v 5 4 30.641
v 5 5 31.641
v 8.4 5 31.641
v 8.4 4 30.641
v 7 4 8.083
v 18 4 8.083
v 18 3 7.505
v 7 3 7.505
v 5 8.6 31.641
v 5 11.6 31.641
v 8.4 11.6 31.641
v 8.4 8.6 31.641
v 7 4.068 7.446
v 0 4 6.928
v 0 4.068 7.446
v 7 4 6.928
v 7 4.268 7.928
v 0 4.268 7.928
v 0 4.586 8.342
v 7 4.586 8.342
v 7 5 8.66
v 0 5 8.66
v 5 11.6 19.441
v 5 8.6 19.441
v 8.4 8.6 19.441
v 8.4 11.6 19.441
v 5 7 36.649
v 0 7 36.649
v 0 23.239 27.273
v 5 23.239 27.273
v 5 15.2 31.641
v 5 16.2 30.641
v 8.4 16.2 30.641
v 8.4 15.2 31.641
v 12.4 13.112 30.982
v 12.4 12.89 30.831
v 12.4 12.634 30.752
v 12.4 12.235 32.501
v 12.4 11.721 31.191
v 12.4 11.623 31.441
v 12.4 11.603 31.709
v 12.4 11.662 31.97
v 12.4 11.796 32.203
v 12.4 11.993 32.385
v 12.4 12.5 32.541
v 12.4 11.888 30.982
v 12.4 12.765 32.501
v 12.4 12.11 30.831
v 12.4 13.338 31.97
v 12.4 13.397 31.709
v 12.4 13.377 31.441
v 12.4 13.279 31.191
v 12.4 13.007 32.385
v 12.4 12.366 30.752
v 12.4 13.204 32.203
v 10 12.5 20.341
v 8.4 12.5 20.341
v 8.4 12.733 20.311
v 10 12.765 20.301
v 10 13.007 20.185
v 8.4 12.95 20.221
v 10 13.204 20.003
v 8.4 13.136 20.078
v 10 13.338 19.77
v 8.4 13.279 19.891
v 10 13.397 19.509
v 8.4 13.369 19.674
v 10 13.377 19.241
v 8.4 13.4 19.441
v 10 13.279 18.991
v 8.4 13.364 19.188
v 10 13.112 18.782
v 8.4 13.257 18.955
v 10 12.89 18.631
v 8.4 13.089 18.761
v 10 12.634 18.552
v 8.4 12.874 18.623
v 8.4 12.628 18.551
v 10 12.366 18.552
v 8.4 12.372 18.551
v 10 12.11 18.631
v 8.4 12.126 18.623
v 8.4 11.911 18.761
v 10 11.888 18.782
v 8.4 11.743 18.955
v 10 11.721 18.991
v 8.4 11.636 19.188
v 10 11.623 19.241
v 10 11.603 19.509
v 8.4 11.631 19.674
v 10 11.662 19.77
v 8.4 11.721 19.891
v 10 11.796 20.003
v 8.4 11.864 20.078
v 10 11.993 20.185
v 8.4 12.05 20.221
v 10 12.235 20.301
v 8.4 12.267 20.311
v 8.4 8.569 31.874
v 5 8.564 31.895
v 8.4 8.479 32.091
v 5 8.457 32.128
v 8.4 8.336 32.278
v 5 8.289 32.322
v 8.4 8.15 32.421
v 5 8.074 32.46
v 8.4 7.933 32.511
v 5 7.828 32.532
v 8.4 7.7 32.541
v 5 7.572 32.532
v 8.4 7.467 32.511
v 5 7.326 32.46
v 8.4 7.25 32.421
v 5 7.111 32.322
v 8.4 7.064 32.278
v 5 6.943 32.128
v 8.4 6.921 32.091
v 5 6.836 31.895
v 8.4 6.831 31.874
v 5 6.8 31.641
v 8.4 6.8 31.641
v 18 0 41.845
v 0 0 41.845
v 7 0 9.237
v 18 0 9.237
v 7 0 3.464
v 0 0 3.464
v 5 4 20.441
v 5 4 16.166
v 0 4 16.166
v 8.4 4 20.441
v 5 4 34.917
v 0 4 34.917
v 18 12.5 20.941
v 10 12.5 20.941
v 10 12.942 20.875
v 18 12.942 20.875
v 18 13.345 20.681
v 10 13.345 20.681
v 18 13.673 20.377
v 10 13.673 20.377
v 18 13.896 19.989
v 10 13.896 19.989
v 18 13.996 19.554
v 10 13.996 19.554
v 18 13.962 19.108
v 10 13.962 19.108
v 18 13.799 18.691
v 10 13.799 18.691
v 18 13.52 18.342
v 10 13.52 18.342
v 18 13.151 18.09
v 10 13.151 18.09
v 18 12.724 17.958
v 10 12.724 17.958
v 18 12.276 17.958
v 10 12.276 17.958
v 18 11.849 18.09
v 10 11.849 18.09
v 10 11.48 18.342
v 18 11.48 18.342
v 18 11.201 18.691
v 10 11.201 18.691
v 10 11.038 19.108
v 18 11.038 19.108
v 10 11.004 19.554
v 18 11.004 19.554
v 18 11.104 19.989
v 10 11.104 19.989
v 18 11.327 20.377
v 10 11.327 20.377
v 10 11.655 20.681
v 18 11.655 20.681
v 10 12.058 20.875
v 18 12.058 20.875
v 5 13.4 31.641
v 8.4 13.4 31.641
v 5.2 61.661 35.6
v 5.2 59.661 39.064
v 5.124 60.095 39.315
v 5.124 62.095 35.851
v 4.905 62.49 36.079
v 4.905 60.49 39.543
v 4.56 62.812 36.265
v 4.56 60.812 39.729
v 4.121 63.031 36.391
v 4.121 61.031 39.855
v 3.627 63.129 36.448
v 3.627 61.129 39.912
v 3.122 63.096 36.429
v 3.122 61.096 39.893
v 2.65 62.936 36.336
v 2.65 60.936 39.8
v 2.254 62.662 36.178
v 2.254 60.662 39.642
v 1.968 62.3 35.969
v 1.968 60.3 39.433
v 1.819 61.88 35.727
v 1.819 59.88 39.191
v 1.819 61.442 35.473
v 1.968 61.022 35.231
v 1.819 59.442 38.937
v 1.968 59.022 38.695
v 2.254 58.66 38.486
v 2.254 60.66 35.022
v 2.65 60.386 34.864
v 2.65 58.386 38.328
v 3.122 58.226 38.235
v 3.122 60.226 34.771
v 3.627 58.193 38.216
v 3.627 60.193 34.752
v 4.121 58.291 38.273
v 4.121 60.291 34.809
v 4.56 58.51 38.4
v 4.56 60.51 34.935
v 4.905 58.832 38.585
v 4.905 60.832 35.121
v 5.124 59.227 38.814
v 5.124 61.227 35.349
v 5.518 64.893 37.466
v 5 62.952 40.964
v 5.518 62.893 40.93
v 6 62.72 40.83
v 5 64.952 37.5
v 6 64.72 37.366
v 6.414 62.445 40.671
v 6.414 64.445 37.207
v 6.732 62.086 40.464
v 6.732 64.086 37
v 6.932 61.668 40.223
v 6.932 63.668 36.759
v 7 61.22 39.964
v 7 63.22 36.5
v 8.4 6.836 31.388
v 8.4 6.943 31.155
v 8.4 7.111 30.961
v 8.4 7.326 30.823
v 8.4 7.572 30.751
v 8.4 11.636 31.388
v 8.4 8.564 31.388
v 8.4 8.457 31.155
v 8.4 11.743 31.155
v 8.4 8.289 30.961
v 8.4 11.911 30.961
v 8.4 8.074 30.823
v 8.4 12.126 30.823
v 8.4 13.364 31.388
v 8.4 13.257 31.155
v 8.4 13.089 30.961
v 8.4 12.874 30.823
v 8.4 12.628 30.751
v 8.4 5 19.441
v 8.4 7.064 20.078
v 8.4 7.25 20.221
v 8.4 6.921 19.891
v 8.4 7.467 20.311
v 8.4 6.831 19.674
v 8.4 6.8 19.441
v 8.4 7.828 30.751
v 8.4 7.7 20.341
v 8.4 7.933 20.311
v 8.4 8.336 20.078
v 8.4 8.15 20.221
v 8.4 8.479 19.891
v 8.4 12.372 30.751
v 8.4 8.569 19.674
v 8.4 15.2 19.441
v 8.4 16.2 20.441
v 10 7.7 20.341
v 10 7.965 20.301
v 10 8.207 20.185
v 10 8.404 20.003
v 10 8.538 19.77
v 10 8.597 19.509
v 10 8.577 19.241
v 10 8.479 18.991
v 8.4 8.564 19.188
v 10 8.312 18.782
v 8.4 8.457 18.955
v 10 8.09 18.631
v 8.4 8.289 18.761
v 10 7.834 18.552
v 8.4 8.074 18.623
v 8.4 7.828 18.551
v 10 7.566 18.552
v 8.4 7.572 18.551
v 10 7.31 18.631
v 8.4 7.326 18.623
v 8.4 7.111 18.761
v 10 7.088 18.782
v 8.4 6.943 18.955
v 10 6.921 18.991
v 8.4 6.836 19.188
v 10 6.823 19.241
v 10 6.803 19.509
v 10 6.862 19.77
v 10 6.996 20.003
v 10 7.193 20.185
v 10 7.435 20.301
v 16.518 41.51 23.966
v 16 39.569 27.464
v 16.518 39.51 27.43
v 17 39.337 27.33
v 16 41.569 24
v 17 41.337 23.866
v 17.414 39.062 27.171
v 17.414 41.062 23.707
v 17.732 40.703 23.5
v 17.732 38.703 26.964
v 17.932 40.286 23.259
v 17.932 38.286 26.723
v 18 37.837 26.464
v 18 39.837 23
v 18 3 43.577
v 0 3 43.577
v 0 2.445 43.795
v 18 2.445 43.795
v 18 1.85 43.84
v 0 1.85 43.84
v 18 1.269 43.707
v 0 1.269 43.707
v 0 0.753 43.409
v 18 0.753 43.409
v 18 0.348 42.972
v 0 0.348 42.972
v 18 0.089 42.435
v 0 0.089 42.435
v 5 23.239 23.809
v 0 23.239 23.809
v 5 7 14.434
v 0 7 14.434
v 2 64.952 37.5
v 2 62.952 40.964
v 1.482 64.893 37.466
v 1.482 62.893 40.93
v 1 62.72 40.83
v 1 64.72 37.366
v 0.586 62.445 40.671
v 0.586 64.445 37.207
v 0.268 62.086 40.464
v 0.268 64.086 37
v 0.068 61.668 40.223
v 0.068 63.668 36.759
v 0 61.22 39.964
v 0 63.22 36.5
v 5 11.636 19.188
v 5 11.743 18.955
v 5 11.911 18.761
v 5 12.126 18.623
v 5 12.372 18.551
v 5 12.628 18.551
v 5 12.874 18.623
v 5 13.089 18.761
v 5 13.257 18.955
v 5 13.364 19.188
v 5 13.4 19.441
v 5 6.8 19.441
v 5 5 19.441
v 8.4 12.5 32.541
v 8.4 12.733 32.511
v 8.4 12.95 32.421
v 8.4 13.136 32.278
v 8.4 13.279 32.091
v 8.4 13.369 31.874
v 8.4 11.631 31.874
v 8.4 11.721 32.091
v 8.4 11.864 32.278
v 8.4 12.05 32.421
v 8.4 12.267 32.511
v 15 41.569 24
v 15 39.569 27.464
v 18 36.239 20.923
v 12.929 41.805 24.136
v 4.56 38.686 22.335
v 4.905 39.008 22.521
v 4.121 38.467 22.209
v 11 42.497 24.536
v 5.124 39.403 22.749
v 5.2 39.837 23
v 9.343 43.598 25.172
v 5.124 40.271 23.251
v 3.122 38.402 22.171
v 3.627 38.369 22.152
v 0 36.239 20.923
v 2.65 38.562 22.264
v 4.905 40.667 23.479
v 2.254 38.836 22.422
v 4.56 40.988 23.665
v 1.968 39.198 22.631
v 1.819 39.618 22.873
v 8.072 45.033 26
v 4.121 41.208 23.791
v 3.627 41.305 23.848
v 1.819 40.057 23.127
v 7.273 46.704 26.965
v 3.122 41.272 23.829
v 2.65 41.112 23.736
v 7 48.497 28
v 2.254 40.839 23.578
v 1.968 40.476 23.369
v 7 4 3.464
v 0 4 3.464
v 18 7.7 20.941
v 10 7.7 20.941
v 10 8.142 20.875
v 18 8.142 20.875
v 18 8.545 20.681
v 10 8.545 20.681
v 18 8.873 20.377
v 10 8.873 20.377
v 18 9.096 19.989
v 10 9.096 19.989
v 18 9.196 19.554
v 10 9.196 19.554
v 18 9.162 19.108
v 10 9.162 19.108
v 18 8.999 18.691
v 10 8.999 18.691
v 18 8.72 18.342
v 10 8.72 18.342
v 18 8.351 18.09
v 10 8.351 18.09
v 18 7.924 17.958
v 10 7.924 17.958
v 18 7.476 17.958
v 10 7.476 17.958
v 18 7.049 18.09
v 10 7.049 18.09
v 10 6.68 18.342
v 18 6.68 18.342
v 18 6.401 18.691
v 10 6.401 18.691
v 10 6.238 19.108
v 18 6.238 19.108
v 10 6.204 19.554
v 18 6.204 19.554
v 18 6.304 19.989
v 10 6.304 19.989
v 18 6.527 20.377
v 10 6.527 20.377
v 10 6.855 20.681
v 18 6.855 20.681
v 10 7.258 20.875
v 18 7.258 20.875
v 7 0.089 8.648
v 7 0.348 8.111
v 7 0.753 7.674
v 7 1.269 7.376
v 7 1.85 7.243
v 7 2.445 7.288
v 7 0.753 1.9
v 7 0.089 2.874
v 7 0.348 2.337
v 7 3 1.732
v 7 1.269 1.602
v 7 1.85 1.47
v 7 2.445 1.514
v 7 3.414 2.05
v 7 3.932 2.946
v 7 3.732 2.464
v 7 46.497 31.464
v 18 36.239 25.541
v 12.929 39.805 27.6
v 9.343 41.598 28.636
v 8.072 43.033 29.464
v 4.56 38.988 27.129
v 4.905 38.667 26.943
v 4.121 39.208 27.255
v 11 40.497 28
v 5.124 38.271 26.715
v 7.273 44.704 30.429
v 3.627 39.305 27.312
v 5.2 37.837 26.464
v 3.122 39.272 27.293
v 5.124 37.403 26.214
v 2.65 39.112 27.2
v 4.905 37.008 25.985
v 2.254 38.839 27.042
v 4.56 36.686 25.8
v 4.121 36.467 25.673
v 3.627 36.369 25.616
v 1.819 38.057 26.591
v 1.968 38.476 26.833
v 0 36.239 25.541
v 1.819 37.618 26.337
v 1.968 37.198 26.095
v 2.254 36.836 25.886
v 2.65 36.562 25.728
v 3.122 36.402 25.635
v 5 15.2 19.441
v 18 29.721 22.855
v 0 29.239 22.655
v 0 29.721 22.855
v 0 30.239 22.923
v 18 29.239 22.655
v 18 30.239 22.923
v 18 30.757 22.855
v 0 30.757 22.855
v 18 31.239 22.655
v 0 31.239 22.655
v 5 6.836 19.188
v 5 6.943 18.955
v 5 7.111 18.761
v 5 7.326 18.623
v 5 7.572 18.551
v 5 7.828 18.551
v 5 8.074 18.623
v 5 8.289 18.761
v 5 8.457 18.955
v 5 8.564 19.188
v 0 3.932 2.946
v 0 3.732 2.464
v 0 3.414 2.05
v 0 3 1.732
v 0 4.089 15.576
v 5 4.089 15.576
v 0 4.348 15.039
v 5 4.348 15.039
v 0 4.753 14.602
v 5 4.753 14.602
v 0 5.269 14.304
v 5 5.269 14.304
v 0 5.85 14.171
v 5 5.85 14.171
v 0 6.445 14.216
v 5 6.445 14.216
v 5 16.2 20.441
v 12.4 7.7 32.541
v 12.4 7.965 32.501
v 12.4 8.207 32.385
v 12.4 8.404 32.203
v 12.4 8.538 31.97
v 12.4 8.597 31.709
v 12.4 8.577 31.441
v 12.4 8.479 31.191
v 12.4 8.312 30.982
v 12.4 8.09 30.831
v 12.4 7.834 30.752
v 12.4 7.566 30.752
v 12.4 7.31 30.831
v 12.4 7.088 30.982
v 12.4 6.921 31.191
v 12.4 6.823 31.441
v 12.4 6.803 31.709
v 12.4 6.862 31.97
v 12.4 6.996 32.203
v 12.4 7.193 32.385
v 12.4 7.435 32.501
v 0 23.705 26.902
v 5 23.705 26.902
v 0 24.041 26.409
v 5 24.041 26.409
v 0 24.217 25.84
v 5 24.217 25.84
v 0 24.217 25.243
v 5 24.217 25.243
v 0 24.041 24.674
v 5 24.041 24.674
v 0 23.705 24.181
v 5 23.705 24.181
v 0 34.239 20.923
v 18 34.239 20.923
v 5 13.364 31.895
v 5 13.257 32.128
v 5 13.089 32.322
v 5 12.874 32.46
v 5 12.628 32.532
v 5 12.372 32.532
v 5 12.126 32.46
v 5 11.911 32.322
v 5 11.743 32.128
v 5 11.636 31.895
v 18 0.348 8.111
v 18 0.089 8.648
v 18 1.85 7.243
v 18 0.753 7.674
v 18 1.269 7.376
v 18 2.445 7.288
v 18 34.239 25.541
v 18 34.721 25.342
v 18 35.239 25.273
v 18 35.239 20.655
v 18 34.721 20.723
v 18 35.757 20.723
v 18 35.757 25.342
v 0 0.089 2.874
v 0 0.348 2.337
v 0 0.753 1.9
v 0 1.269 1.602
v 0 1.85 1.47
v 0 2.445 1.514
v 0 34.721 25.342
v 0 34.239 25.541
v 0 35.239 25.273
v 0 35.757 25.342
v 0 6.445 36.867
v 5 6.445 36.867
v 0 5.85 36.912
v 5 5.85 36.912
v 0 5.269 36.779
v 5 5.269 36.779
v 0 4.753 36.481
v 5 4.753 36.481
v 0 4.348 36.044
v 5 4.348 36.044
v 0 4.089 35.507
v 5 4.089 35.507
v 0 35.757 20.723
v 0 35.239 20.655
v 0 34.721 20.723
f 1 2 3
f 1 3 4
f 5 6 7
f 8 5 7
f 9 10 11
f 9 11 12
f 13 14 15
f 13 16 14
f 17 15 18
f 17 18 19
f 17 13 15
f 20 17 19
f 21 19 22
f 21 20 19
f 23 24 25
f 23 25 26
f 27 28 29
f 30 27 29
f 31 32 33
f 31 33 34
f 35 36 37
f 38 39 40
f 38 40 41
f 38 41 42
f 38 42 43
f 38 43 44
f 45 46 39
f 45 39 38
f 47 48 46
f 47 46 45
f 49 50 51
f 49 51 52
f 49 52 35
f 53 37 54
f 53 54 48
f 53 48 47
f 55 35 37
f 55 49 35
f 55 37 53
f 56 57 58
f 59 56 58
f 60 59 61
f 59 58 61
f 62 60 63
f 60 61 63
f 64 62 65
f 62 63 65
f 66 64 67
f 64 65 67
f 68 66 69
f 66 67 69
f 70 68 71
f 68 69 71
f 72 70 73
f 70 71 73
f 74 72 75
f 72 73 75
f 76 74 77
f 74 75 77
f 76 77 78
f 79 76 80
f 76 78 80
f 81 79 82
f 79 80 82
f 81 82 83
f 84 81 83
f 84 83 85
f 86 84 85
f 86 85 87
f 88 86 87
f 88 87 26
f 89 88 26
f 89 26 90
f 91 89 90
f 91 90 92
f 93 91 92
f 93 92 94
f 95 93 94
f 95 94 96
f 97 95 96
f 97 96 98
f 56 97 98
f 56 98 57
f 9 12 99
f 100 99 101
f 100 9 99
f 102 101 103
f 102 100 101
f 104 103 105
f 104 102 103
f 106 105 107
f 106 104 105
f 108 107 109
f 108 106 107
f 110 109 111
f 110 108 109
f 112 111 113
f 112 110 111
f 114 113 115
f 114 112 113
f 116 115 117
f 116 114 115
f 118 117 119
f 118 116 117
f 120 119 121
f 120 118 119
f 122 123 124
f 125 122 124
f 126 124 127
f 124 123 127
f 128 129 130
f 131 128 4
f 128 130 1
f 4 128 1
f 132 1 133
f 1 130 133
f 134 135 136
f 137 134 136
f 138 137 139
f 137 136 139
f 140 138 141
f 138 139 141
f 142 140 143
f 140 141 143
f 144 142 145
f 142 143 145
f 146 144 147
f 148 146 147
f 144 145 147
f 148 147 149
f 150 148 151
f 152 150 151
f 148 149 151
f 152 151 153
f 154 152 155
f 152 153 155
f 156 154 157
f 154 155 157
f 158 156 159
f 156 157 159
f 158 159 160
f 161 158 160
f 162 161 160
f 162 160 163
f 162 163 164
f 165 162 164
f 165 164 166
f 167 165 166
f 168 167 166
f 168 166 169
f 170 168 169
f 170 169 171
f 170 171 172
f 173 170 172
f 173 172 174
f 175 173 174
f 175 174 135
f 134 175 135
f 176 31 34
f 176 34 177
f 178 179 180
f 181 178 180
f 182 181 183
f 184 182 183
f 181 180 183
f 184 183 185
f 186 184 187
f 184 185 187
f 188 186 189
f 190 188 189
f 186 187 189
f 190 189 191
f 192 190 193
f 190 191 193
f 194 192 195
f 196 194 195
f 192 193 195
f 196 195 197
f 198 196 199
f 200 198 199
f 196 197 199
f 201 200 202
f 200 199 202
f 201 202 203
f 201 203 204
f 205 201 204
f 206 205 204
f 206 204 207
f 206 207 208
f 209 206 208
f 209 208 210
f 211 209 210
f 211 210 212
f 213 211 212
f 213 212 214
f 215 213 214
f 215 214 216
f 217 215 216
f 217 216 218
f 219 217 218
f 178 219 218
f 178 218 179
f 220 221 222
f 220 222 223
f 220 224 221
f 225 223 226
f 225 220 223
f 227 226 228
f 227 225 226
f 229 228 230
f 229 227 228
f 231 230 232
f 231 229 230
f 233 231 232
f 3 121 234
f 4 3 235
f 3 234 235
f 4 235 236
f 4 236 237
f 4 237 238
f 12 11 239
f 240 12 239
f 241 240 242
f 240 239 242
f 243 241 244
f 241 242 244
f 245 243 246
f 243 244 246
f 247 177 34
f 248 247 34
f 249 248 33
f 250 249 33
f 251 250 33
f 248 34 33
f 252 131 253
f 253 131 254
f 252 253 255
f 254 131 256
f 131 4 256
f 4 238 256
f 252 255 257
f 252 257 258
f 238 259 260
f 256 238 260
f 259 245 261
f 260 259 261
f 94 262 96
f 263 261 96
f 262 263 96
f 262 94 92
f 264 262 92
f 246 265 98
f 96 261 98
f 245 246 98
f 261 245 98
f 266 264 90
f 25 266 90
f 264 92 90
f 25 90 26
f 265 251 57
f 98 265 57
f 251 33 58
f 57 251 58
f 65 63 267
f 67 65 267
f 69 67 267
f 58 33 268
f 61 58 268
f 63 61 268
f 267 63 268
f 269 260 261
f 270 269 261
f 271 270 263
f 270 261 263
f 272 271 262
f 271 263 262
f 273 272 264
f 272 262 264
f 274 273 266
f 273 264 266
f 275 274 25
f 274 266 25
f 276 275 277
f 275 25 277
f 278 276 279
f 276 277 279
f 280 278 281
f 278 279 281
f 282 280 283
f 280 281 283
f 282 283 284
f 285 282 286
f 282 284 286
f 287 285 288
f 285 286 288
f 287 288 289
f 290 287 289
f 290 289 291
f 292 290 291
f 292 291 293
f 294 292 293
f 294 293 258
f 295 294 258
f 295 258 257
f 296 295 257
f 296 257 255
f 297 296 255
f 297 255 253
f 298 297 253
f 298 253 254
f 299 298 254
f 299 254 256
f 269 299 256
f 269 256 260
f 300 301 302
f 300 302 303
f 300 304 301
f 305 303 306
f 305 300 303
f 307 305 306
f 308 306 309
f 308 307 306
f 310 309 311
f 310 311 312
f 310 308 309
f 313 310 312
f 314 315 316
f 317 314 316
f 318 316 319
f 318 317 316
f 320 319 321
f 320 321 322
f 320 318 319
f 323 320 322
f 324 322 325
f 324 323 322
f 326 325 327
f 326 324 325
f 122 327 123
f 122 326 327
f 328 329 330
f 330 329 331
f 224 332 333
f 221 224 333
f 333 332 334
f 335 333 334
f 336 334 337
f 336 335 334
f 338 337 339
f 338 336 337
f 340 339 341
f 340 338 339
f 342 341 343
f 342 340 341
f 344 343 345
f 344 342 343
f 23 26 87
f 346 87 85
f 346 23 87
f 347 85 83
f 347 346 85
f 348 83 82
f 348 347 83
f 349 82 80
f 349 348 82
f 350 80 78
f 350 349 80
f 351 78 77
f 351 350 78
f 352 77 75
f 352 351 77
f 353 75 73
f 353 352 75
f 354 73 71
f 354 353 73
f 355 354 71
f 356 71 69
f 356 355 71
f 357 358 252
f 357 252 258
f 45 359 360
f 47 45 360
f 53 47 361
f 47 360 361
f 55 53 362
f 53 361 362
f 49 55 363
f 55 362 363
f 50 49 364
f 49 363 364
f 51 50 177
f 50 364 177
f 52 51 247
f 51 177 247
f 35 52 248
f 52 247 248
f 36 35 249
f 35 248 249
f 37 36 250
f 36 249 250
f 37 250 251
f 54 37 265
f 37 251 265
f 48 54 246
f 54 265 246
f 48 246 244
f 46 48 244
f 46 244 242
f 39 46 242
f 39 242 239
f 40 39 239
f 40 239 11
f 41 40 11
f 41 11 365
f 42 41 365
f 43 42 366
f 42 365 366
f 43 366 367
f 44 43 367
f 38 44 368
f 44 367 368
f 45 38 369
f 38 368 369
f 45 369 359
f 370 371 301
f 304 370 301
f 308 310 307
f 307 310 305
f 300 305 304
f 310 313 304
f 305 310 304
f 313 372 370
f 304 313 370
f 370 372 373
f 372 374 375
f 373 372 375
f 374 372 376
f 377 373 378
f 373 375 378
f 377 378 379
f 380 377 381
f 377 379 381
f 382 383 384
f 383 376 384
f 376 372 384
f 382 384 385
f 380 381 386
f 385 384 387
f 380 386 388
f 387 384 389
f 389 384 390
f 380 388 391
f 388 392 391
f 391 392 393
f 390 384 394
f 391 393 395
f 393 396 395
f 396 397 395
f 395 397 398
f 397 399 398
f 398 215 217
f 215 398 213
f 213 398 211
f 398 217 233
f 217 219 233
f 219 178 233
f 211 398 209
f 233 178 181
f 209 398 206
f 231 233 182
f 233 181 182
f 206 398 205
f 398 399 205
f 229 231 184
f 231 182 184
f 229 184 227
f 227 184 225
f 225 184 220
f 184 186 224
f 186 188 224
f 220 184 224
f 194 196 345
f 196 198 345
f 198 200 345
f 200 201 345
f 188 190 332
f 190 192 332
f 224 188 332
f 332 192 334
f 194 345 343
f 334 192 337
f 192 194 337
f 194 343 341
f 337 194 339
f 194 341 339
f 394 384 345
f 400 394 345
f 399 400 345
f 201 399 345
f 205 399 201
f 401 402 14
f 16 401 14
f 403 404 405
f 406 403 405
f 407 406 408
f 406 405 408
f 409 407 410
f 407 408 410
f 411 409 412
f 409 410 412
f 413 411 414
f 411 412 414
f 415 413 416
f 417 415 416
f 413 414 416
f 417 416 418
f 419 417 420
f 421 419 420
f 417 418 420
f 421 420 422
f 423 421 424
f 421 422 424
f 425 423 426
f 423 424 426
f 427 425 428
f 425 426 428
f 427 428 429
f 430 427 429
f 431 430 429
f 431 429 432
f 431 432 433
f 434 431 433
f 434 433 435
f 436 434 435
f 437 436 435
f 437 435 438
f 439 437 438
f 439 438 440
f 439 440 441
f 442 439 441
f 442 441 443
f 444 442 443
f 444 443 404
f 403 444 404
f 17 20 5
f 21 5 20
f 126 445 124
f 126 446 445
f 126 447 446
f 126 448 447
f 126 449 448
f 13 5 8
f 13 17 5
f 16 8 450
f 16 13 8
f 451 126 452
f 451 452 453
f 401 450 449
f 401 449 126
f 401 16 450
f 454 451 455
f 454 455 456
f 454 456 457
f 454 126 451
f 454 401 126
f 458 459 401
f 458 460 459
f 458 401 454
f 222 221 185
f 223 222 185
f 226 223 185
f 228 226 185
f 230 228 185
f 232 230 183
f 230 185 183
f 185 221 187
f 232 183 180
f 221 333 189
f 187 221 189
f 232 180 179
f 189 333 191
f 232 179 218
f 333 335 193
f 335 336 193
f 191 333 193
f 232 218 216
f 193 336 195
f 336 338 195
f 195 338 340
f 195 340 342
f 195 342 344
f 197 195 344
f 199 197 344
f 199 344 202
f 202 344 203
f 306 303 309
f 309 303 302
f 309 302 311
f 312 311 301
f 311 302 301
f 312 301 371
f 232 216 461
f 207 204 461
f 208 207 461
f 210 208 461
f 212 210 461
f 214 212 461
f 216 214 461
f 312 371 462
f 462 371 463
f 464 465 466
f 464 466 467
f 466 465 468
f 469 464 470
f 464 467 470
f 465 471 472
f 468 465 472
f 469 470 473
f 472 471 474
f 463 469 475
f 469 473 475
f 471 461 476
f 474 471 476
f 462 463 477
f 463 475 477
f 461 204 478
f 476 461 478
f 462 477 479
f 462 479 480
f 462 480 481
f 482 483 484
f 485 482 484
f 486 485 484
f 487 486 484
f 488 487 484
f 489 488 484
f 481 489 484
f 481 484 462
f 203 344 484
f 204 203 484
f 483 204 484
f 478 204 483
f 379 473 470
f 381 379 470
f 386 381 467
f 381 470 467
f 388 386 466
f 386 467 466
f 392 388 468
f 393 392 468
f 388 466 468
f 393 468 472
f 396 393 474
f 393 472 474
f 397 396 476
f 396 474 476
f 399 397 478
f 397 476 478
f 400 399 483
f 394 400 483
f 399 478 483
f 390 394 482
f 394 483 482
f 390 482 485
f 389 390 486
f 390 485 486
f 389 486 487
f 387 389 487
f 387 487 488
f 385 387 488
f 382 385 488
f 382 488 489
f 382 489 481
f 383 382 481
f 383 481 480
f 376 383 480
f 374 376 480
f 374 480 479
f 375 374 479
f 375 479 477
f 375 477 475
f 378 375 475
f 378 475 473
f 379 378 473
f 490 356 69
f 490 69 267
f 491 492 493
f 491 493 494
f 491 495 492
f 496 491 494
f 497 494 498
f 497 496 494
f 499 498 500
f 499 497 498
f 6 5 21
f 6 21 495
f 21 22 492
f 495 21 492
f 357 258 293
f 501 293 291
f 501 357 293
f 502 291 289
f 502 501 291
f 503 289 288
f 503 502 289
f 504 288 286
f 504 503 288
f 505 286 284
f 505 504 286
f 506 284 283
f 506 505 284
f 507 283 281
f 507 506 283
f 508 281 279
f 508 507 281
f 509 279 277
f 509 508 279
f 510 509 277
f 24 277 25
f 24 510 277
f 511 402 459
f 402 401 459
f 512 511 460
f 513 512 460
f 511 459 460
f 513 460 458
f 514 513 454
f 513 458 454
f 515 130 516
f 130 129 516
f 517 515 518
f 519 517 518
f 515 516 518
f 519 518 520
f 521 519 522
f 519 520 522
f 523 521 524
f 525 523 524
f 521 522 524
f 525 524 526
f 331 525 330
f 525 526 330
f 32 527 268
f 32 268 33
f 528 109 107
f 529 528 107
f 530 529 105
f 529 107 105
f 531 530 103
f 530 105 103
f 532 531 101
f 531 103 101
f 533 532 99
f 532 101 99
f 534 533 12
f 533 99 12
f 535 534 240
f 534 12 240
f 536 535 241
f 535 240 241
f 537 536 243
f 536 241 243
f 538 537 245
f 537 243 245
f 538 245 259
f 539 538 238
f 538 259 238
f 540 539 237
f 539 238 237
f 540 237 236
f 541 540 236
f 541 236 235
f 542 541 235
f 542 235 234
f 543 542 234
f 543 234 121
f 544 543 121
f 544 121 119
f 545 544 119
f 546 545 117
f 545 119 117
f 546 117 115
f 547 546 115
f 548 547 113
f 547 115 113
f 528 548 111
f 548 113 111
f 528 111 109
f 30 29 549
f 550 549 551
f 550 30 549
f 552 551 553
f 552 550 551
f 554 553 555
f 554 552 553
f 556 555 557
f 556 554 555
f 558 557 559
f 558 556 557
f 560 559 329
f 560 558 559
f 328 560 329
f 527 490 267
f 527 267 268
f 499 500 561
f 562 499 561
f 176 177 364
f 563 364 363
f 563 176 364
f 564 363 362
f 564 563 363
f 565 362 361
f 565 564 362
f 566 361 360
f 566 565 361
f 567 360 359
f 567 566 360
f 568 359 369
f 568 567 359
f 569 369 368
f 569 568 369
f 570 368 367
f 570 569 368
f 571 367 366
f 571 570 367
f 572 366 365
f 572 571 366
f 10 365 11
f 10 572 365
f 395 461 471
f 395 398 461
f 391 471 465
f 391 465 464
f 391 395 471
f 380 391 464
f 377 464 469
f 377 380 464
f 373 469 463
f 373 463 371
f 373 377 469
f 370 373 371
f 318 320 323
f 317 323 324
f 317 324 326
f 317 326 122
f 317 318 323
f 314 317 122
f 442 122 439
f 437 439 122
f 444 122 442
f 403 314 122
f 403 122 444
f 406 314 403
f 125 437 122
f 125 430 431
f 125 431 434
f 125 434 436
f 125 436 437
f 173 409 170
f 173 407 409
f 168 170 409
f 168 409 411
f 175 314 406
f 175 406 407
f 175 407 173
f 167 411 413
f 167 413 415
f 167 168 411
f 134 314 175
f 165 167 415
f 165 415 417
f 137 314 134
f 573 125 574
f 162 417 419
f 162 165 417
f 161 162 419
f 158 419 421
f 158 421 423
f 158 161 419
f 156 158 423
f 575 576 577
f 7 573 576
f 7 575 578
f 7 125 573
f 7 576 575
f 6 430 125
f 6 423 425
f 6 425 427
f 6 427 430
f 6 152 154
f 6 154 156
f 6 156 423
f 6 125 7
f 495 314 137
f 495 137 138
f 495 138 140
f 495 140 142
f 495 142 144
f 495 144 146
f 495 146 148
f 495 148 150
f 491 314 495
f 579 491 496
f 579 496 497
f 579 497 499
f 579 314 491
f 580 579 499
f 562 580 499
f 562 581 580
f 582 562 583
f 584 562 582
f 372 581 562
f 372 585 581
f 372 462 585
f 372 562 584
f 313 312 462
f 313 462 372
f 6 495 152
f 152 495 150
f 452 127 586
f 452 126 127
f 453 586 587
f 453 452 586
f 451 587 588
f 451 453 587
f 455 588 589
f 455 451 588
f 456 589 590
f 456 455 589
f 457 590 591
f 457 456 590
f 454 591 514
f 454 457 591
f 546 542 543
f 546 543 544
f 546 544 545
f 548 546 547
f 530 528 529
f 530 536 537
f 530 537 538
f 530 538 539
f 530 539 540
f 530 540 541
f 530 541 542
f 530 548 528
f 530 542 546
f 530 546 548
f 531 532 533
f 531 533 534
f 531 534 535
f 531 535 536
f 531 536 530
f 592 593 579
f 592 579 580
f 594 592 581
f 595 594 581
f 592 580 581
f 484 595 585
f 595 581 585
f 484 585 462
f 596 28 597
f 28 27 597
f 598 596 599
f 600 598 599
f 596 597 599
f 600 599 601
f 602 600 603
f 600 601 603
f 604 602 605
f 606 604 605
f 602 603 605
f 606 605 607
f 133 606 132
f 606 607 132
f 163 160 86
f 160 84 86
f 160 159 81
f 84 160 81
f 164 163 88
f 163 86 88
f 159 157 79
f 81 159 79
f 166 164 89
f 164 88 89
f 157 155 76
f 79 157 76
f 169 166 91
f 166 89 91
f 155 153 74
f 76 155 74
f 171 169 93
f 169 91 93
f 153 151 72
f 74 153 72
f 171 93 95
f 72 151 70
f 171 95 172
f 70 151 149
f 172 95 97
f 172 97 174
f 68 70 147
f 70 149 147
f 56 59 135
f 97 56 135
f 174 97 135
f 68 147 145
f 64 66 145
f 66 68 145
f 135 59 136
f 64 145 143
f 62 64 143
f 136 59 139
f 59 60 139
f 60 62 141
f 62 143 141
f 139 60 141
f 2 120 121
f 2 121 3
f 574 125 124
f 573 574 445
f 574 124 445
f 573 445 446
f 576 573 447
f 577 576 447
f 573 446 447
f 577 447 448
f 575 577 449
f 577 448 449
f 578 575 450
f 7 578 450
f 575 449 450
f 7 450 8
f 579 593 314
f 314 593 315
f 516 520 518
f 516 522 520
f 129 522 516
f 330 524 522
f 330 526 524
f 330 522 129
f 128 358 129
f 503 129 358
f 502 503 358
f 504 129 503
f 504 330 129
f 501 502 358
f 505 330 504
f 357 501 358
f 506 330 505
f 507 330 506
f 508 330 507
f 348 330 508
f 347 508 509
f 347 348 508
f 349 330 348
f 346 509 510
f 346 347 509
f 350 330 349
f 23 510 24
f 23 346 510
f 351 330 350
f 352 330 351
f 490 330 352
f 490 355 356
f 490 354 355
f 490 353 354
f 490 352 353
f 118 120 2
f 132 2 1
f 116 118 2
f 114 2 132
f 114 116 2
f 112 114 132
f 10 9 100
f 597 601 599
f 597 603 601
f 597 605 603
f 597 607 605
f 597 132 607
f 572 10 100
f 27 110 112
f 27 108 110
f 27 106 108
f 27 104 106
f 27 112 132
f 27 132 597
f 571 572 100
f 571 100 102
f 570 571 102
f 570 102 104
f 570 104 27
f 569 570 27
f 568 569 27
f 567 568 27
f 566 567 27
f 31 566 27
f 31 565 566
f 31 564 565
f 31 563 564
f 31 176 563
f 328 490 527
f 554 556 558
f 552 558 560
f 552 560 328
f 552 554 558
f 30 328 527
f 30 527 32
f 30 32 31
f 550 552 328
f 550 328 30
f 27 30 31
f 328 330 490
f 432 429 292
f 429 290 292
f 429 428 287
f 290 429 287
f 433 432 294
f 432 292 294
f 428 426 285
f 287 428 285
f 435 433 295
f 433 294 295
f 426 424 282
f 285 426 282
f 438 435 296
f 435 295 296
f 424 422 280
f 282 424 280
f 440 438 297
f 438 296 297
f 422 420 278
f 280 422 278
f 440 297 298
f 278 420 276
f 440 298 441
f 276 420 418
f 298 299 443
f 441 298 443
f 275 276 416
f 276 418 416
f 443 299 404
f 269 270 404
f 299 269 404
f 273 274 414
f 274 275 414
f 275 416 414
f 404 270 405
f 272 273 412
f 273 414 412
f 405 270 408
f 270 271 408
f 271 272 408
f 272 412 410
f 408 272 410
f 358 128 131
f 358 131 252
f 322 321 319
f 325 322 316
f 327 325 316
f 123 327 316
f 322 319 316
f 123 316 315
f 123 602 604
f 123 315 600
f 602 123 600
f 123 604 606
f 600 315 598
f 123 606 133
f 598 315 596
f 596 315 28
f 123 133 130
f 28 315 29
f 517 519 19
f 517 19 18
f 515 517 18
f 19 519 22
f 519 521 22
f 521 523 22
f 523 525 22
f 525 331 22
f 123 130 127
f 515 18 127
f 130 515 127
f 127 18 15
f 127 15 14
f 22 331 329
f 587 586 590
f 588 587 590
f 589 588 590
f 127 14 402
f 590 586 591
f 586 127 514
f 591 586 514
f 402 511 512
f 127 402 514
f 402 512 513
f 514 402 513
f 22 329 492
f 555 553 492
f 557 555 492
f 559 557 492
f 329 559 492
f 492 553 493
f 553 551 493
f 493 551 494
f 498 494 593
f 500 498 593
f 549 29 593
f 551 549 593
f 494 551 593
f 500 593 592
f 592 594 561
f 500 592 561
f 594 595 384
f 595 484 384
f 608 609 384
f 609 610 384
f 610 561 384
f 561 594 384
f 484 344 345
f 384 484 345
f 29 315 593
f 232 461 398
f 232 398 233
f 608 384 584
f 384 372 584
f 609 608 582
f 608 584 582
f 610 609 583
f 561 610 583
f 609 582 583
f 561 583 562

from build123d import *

# Parameters (mm, degrees)
BOSS_EXTRU_1_DEPTH      = 18
ENL_V_MAT_EXTRU_1_REACH = 82.979
ESQUISSE4_W             = 11
ESQUISSE4_H             = 27
ENL_V_MAT_EXTRU_2_DEPTH = 11
D_GAGEMENT_M31_D        = 3.4
ENL_V_MAT_EXTRU_3_DEPTH = 8.4
ESQUISSE10_R            = 0.9
ENL_V_MAT_EXTRU_4_DEPTH = 4
ENL_V_MAT_EXTRU_5_DEPTH = 5
CONG_1_R                = 2
CONG_2_R                = 8
ENL_V_START             = -1.6
ESQUISSE13_R            = 1.5
ENL_V_MAT_EXTRU_6_DEPTH = 78.3514199


with BuildPart() as part:
    # Esquisse1 → Boss.-Extru.1 (new body)
    with BuildSketch(Plane(origin=(0, 0, 0), x_dir=(0, 0, -1), z_dir=(1, 0, 0))):
        Polygon((-37.5, 64.951905284), (-40.964101615, 62.951905284), (-24.964101615, 35.239092363), (-45.309401077, 0), (0, 0), (-2.309401077, 4), (-8.082903769, 4), (-23.232050808, 30.239092363), (-20.345299462, 35.239092363), align=None)
    extrude(amount=BOSS_EXTRU_1_DEPTH)

    # Esquisse4 → Enlèv. mat.-Extru.1 (cut, up to next)
    with BuildSketch(Plane(origin=(0, -2, 3.464101615), x_dir=(1, 0, 0), z_dir=(0, -0.5000000000000047, 0.8660254037844359)), mode=Mode.PRIVATE) as enl_v_mat_extru_1_sk1:
        with Locations((12.5, 61.5)):
            Rectangle(ESQUISSE4_W, ESQUISSE4_H)
    enl_v_mat_extru_1_tool1 = extrude(enl_v_mat_extru_1_sk1.sketch, amount=-ENL_V_MAT_EXTRU_1_REACH, mode=Mode.PRIVATE) & part.part
    add(enl_v_mat_extru_1_tool1.solids().sort_by_distance((12.5, 51.260562, 34.214102))[0], mode=Mode.SUBTRACT)

    # Esquisse6 → Enlèv. mat.-Extru.2 (cut)
    with BuildSketch(Plane(origin=(18, 0, 0), x_dir=(0, 0, -1), z_dir=(1, 0, 0))):
        Polygon((0, 0), (-2.309401077, 4), (-8.082903769, 4), (-5.773502692, 0), align=None)
    extrude(amount=-ENL_V_MAT_EXTRU_2_DEPTH, mode=Mode.SUBTRACT)

    # Dégagement M31 (through all)
    with Locations(Plane(origin=(0, 0, 0), x_dir=(-1, 0, 0), z_dir=(0, 0.5000000000000047, -0.866025403784436))):
        with Locations((-3.5, 71.2), (-3.5, 46)):
            Hole(D_GAGEMENT_M31_D / 2)

    # Esquisse9 → Enlèv. mat.-Extru.3 (cut)
    with BuildSketch(Plane.ZY):
        with BuildLine():
            Line((19.441451884, 15.2), (20.441451884, 16.2))
            Line((20.441451884, 16.2), (30.641451884, 16.2))
            Line((30.641451884, 16.2), (31.641451884, 15.2))
            Line((31.641451884, 15.2), (31.641451884, 13.4))
            ThreePointArc((31.641451884, 13.4), (32.541451884, 12.5), (31.641451884, 11.6))
            Line((31.641451884, 11.6), (31.641451884, 8.6))
            ThreePointArc((31.641451884, 8.6), (32.541451884, 7.7), (31.641451884, 6.8))
            Line((31.641451884, 6.8), (31.641451884, 5))
            Line((31.641451884, 5), (30.641451884, 4))
            Line((30.641451884, 4), (20.441451884, 4))
            Line((20.441451884, 4), (19.441451884, 5))
            Line((19.441451884, 5), (19.441451884, 6.8))
            ThreePointArc((19.441451884, 6.8), (18.541451884, 7.7), (19.441451884, 8.6))
            Line((19.441451884, 8.6), (19.441451884, 11.6))
            ThreePointArc((19.441451884, 11.6), (18.541451884, 12.5), (19.441451884, 13.4))
            Line((19.441451884, 13.4), (19.441451884, 15.2))
        make_face()
    extrude(amount=-ENL_V_MAT_EXTRU_3_DEPTH, mode=Mode.SUBTRACT)

    # Esquisse10 → Enlèv. mat.-Extru.4 (cut)
    with BuildSketch(Plane.ZY.offset(-8.4)):
        with Locations((19.441451884, 12.5)):
            Circle(ESQUISSE10_R)
        with Locations((19.441451884, 7.7)):
            Circle(ESQUISSE10_R)
        with Locations((31.641451884, 12.5)):
            Circle(ESQUISSE10_R)
        with Locations((31.641451884, 7.7)):
            Circle(ESQUISSE10_R)
    extrude(amount=-ENL_V_MAT_EXTRU_4_DEPTH, mode=Mode.SUBTRACT)

    # Esquisse11 → Enlèv. mat.-Extru.5 (cut)
    with BuildSketch(Plane.ZY):
        Polygon((25.541451884, 26.239092363), (12.701705922, 4), (38.381197846, 4), align=None)
    extrude(amount=-ENL_V_MAT_EXTRU_5_DEPTH, mode=Mode.SUBTRACT)

    # Congé1
    cong_1_edges = [part.edges().sort_by_distance(p)[0] for p in [
        (0, 63.951905284, 39.232050808),
        (2.5, 4, 38.381197846),
        (2.5, 26.239092363, 25.541451884),
        (2.5, 4, 12.701705922),
        (9, 0, 45.309401077),
        (9, 35.239092363, 24.964101615),
        (9, 35.239092363, 20.345299462),
        (9, 30.239092363, 23.232050808),
        (18, 40.569219382, 25.732050808),
        (7, 63.951905284, 39.232050808),
        (3.5, 0, 0),
        (3.5, 4, 8.082903769),
        (3.5, 4, 2.309401077),
        (12.5, 0, 5.773502692),
    ]]
    fillet(cong_1_edges, radius=CONG_1_R - 0.0001)  # a hair under: the kernel refuses the full size

    # Congé2
    cong_2_edges = [part.edges().sort_by_distance(p)[0] for p in [
        (7, 40.569219382, 25.732050808),
    ]]
    fillet(cong_2_edges, radius=CONG_2_R)

    # Esquisse13 → Enlèv. mat.-Extru.6 (cut, through all)
    with BuildSketch(Plane.ZY.offset(-8.4).offset(ENL_V_START)):
        with Locations((19.441451884, 12.5)):
            Circle(ESQUISSE13_R)
        with Locations((19.441451884, 7.7)):
            Circle(ESQUISSE13_R)
    extrude(amount=-ENL_V_MAT_EXTRU_6_DEPTH, mode=Mode.SUBTRACT)


solid = part.part
